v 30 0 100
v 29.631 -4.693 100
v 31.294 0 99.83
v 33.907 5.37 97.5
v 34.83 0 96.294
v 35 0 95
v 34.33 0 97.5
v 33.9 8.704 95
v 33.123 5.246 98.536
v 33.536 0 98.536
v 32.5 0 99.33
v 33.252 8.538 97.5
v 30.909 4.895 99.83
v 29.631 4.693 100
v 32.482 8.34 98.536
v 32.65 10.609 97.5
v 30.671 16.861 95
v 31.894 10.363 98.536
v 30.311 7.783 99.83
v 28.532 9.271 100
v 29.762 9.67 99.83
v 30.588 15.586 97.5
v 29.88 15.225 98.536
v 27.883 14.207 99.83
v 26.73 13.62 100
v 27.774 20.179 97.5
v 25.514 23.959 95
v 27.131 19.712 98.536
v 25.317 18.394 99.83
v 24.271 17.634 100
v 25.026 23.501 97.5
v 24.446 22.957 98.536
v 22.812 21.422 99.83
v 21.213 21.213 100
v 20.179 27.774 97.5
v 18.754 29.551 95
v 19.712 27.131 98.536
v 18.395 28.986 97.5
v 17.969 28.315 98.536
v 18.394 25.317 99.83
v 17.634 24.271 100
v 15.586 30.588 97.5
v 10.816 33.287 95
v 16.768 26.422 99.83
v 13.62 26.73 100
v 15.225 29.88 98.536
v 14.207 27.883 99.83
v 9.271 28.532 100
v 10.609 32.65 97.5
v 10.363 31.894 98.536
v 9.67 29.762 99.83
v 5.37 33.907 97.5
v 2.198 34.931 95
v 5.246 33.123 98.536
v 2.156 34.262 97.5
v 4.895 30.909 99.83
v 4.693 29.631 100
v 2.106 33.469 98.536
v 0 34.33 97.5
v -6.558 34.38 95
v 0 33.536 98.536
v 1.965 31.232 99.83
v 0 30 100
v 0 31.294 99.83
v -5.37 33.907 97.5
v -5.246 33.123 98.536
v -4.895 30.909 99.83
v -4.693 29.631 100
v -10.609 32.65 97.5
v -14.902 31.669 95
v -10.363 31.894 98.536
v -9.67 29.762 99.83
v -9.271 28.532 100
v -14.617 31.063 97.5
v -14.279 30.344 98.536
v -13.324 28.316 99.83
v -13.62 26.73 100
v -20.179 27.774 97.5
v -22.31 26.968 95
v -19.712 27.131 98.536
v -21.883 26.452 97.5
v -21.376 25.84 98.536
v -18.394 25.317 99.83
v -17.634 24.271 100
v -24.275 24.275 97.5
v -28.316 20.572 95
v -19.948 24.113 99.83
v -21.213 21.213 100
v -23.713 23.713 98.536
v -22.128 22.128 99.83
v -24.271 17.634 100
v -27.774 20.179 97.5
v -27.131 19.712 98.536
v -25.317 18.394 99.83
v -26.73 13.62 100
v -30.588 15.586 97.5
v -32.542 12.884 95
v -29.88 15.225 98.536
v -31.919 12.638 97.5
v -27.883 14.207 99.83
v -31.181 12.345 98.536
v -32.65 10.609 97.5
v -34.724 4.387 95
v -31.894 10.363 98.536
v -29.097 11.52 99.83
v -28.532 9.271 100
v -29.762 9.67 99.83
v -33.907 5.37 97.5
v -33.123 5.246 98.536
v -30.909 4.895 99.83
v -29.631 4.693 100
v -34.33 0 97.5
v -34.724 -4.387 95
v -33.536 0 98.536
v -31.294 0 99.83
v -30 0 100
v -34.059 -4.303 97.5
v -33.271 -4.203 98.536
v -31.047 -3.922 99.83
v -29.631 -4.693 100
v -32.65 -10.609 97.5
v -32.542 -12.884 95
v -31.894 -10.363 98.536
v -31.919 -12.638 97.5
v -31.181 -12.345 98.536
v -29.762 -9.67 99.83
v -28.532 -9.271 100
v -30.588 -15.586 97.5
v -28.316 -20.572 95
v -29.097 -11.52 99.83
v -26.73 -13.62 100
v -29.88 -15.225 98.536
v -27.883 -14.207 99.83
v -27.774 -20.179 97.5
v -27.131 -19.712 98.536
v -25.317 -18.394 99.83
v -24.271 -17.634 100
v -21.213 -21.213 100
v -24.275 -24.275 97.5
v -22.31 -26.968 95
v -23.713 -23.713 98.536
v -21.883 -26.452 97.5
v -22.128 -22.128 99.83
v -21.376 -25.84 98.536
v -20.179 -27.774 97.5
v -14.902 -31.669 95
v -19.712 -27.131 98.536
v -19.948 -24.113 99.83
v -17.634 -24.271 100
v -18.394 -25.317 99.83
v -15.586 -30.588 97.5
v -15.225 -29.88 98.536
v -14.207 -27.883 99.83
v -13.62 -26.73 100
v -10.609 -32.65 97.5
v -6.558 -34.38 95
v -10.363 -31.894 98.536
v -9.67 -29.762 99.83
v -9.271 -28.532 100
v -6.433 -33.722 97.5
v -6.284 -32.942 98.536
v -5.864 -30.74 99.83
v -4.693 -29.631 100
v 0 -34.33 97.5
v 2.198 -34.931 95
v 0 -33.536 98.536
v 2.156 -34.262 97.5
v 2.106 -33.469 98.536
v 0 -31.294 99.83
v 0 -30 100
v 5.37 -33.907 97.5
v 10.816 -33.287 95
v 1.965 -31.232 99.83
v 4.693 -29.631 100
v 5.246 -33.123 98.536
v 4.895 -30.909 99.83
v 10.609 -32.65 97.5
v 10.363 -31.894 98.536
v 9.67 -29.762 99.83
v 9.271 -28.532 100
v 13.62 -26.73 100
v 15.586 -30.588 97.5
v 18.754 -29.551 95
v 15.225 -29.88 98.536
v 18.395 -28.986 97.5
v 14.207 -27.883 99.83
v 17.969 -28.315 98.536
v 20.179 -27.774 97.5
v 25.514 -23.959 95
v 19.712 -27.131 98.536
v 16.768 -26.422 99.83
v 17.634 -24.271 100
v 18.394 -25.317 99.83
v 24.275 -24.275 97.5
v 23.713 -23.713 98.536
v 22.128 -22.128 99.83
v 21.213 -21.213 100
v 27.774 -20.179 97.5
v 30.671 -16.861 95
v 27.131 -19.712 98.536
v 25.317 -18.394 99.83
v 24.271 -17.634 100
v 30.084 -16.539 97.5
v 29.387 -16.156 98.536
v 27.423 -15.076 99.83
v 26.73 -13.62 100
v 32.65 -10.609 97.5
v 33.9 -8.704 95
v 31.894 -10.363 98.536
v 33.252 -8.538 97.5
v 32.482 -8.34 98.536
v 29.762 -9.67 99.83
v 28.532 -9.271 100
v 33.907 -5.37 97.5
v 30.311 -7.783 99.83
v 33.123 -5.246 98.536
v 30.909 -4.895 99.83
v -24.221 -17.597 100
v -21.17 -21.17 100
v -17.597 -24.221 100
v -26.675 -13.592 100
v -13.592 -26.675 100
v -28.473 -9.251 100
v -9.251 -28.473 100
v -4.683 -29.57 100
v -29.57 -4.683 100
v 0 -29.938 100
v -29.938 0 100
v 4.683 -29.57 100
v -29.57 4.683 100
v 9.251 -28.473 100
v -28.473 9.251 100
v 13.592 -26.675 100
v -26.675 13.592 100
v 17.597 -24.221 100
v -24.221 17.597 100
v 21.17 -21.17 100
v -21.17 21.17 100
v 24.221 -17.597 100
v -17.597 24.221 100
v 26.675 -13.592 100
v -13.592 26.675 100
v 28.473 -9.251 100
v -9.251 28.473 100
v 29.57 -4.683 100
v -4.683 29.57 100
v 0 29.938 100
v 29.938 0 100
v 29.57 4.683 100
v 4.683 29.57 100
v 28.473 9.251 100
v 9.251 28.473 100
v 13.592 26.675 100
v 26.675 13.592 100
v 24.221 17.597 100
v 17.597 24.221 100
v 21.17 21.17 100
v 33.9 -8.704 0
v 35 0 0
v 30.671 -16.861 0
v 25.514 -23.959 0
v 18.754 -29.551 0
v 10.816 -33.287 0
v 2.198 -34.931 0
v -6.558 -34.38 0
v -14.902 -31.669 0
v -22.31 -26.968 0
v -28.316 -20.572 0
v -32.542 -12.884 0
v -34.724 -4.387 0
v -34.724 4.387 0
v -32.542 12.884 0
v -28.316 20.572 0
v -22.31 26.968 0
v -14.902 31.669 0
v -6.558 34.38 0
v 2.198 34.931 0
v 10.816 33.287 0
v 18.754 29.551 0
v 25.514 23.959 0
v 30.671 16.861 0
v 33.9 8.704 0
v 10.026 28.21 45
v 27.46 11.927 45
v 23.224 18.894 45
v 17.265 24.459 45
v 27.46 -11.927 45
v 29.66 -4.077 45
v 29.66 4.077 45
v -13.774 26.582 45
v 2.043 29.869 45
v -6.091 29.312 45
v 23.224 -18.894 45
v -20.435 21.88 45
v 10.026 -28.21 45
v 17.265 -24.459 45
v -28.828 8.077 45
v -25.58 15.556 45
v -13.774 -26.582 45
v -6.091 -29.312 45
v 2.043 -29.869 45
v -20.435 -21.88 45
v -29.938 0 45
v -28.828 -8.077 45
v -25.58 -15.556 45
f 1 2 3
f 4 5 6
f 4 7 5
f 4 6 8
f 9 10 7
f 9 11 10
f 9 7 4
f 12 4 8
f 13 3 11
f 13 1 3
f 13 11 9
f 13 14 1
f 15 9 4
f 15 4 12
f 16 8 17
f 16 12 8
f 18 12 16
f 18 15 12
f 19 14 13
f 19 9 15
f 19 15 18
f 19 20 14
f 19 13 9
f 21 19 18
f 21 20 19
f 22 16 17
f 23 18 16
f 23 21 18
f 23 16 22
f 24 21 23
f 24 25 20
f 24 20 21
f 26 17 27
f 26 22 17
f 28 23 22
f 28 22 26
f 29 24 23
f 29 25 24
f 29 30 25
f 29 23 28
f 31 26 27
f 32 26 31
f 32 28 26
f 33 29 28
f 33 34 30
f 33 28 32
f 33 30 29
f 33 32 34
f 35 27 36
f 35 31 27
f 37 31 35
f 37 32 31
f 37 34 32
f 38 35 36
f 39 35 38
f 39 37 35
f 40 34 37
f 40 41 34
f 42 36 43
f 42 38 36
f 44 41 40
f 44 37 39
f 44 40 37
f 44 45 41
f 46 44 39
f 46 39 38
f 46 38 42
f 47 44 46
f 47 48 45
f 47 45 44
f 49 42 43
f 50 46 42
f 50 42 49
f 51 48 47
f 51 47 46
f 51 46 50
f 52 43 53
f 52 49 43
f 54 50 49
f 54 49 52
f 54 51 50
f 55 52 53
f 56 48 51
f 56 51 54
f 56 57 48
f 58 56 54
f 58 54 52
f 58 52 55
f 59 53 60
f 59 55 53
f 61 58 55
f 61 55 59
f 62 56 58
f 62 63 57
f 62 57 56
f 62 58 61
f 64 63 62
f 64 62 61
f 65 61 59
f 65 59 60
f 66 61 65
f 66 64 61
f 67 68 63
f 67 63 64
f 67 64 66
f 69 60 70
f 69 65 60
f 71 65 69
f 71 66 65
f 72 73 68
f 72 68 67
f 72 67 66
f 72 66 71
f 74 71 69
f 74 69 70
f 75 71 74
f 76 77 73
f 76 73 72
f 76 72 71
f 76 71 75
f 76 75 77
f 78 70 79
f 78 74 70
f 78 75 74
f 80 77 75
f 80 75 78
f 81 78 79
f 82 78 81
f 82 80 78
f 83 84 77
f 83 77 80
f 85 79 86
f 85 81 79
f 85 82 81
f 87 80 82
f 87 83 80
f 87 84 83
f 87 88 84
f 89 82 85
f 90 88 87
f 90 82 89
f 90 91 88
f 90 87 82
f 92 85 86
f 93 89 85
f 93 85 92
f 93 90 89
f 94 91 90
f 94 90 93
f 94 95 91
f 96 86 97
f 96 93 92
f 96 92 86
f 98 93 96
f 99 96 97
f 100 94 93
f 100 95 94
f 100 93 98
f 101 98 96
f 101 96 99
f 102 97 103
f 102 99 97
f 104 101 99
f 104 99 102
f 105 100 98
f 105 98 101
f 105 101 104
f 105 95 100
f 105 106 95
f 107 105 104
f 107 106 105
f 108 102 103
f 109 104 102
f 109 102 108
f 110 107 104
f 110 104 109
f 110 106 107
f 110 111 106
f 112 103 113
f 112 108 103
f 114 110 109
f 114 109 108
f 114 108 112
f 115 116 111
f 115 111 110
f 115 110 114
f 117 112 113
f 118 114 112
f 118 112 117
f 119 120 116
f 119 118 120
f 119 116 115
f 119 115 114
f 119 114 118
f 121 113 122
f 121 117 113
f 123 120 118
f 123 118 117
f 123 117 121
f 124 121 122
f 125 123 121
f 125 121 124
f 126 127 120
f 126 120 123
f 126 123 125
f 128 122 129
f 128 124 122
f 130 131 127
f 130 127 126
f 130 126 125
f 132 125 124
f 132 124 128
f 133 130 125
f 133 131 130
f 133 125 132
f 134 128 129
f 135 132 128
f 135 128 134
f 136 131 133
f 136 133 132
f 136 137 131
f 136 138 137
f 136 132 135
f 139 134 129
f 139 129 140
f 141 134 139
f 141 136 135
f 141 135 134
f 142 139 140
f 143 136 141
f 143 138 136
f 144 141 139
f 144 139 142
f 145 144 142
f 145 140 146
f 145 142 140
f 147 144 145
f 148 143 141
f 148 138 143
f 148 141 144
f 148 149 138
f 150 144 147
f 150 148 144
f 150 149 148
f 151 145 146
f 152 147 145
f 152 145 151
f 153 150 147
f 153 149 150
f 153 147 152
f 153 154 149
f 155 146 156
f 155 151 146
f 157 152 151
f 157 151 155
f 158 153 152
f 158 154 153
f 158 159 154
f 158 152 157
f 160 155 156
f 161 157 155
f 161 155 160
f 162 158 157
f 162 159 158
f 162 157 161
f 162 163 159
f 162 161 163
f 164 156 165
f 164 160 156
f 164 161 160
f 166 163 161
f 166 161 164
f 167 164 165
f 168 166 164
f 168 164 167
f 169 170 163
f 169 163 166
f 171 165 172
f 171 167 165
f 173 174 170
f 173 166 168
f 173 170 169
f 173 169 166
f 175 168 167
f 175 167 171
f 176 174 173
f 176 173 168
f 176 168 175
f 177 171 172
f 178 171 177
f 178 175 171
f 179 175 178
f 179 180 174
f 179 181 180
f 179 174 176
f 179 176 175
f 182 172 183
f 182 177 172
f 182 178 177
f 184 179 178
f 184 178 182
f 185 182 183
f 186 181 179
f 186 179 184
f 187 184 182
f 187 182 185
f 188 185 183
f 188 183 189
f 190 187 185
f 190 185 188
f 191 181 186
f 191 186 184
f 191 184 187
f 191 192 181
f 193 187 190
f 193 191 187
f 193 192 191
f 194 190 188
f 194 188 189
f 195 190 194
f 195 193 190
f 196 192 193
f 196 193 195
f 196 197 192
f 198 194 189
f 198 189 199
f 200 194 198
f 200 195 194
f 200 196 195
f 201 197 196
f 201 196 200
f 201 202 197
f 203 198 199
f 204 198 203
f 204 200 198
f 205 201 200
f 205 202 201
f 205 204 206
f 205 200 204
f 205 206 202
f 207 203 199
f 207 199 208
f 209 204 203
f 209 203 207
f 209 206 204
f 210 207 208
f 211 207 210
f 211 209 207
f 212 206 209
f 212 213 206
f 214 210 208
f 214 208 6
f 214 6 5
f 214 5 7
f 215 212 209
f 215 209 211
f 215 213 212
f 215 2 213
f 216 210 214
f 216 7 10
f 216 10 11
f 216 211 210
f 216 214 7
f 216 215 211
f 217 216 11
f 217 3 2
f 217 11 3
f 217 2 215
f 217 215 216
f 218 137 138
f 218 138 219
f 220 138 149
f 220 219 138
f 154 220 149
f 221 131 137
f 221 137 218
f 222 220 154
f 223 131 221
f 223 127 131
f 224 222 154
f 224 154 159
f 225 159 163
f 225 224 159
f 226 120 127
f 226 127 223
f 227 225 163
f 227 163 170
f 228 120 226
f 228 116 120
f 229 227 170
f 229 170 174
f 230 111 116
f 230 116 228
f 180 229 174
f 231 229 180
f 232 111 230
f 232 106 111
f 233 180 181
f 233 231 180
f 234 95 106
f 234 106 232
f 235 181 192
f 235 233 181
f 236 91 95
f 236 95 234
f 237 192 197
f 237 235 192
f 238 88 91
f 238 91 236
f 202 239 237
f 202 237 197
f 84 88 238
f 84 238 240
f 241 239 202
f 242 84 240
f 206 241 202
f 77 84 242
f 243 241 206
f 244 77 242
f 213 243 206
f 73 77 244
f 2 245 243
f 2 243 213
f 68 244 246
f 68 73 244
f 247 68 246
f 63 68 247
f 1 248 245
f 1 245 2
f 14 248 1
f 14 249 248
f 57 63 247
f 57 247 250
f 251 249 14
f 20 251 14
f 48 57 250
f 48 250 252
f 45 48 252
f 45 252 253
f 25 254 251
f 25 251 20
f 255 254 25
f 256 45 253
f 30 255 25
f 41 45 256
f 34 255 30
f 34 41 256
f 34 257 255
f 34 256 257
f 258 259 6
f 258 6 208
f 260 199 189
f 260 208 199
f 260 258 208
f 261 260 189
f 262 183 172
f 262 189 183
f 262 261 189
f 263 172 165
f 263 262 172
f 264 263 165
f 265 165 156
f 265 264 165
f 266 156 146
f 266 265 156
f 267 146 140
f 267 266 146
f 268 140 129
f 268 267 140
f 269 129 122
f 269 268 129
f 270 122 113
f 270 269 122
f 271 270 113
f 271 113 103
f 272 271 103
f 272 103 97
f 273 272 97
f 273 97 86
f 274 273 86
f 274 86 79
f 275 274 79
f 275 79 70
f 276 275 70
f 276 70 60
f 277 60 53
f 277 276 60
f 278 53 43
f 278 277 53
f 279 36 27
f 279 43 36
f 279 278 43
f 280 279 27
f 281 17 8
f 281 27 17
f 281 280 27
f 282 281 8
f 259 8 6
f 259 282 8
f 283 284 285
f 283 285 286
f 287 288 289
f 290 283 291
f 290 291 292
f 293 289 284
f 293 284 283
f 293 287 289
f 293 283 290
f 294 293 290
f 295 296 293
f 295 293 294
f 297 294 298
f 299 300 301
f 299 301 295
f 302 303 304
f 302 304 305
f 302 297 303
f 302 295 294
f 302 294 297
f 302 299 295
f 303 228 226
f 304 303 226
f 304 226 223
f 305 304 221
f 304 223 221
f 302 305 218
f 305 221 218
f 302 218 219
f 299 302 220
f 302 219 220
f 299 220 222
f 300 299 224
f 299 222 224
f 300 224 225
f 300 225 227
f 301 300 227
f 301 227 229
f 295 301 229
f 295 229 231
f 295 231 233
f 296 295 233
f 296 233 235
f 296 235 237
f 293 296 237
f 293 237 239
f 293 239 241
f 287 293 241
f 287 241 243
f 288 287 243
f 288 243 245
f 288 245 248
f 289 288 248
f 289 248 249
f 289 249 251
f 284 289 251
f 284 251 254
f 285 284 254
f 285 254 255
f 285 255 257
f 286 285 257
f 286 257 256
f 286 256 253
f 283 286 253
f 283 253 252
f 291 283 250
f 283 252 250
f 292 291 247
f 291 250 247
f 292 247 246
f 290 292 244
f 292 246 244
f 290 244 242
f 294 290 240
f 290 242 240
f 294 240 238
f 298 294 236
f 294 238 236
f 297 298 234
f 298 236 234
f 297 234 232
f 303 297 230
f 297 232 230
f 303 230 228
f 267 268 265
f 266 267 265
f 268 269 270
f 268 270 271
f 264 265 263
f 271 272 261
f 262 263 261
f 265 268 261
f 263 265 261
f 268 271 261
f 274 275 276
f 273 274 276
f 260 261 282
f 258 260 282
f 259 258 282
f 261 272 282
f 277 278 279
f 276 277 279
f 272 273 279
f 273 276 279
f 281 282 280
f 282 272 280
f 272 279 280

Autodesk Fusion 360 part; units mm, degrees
sketch "Sketch1" plane through (0, 0, 0) normal (0, 0, 1) x (1, 0, 0)
  circle A0 centre (0, 0) radius 35
  dimension "d6" = 70
extrude "Extrude1" add sketch "Sketch1" along normal blind 100
sketch "Sketch2" plane through (0, 0, 100) normal (0, 0, 1) x (-1, 0, 0)
  circle A0 centre (0, 0) radius 35
  circle A1 centre (0, 0) radius 29.9384
extrude "Extrude2" cut sketch "Sketch2" against normal blind 55 contours A1
fillet "Fillet1" radius 5 1 edges at (-32.6315, -12.6565, 100)
